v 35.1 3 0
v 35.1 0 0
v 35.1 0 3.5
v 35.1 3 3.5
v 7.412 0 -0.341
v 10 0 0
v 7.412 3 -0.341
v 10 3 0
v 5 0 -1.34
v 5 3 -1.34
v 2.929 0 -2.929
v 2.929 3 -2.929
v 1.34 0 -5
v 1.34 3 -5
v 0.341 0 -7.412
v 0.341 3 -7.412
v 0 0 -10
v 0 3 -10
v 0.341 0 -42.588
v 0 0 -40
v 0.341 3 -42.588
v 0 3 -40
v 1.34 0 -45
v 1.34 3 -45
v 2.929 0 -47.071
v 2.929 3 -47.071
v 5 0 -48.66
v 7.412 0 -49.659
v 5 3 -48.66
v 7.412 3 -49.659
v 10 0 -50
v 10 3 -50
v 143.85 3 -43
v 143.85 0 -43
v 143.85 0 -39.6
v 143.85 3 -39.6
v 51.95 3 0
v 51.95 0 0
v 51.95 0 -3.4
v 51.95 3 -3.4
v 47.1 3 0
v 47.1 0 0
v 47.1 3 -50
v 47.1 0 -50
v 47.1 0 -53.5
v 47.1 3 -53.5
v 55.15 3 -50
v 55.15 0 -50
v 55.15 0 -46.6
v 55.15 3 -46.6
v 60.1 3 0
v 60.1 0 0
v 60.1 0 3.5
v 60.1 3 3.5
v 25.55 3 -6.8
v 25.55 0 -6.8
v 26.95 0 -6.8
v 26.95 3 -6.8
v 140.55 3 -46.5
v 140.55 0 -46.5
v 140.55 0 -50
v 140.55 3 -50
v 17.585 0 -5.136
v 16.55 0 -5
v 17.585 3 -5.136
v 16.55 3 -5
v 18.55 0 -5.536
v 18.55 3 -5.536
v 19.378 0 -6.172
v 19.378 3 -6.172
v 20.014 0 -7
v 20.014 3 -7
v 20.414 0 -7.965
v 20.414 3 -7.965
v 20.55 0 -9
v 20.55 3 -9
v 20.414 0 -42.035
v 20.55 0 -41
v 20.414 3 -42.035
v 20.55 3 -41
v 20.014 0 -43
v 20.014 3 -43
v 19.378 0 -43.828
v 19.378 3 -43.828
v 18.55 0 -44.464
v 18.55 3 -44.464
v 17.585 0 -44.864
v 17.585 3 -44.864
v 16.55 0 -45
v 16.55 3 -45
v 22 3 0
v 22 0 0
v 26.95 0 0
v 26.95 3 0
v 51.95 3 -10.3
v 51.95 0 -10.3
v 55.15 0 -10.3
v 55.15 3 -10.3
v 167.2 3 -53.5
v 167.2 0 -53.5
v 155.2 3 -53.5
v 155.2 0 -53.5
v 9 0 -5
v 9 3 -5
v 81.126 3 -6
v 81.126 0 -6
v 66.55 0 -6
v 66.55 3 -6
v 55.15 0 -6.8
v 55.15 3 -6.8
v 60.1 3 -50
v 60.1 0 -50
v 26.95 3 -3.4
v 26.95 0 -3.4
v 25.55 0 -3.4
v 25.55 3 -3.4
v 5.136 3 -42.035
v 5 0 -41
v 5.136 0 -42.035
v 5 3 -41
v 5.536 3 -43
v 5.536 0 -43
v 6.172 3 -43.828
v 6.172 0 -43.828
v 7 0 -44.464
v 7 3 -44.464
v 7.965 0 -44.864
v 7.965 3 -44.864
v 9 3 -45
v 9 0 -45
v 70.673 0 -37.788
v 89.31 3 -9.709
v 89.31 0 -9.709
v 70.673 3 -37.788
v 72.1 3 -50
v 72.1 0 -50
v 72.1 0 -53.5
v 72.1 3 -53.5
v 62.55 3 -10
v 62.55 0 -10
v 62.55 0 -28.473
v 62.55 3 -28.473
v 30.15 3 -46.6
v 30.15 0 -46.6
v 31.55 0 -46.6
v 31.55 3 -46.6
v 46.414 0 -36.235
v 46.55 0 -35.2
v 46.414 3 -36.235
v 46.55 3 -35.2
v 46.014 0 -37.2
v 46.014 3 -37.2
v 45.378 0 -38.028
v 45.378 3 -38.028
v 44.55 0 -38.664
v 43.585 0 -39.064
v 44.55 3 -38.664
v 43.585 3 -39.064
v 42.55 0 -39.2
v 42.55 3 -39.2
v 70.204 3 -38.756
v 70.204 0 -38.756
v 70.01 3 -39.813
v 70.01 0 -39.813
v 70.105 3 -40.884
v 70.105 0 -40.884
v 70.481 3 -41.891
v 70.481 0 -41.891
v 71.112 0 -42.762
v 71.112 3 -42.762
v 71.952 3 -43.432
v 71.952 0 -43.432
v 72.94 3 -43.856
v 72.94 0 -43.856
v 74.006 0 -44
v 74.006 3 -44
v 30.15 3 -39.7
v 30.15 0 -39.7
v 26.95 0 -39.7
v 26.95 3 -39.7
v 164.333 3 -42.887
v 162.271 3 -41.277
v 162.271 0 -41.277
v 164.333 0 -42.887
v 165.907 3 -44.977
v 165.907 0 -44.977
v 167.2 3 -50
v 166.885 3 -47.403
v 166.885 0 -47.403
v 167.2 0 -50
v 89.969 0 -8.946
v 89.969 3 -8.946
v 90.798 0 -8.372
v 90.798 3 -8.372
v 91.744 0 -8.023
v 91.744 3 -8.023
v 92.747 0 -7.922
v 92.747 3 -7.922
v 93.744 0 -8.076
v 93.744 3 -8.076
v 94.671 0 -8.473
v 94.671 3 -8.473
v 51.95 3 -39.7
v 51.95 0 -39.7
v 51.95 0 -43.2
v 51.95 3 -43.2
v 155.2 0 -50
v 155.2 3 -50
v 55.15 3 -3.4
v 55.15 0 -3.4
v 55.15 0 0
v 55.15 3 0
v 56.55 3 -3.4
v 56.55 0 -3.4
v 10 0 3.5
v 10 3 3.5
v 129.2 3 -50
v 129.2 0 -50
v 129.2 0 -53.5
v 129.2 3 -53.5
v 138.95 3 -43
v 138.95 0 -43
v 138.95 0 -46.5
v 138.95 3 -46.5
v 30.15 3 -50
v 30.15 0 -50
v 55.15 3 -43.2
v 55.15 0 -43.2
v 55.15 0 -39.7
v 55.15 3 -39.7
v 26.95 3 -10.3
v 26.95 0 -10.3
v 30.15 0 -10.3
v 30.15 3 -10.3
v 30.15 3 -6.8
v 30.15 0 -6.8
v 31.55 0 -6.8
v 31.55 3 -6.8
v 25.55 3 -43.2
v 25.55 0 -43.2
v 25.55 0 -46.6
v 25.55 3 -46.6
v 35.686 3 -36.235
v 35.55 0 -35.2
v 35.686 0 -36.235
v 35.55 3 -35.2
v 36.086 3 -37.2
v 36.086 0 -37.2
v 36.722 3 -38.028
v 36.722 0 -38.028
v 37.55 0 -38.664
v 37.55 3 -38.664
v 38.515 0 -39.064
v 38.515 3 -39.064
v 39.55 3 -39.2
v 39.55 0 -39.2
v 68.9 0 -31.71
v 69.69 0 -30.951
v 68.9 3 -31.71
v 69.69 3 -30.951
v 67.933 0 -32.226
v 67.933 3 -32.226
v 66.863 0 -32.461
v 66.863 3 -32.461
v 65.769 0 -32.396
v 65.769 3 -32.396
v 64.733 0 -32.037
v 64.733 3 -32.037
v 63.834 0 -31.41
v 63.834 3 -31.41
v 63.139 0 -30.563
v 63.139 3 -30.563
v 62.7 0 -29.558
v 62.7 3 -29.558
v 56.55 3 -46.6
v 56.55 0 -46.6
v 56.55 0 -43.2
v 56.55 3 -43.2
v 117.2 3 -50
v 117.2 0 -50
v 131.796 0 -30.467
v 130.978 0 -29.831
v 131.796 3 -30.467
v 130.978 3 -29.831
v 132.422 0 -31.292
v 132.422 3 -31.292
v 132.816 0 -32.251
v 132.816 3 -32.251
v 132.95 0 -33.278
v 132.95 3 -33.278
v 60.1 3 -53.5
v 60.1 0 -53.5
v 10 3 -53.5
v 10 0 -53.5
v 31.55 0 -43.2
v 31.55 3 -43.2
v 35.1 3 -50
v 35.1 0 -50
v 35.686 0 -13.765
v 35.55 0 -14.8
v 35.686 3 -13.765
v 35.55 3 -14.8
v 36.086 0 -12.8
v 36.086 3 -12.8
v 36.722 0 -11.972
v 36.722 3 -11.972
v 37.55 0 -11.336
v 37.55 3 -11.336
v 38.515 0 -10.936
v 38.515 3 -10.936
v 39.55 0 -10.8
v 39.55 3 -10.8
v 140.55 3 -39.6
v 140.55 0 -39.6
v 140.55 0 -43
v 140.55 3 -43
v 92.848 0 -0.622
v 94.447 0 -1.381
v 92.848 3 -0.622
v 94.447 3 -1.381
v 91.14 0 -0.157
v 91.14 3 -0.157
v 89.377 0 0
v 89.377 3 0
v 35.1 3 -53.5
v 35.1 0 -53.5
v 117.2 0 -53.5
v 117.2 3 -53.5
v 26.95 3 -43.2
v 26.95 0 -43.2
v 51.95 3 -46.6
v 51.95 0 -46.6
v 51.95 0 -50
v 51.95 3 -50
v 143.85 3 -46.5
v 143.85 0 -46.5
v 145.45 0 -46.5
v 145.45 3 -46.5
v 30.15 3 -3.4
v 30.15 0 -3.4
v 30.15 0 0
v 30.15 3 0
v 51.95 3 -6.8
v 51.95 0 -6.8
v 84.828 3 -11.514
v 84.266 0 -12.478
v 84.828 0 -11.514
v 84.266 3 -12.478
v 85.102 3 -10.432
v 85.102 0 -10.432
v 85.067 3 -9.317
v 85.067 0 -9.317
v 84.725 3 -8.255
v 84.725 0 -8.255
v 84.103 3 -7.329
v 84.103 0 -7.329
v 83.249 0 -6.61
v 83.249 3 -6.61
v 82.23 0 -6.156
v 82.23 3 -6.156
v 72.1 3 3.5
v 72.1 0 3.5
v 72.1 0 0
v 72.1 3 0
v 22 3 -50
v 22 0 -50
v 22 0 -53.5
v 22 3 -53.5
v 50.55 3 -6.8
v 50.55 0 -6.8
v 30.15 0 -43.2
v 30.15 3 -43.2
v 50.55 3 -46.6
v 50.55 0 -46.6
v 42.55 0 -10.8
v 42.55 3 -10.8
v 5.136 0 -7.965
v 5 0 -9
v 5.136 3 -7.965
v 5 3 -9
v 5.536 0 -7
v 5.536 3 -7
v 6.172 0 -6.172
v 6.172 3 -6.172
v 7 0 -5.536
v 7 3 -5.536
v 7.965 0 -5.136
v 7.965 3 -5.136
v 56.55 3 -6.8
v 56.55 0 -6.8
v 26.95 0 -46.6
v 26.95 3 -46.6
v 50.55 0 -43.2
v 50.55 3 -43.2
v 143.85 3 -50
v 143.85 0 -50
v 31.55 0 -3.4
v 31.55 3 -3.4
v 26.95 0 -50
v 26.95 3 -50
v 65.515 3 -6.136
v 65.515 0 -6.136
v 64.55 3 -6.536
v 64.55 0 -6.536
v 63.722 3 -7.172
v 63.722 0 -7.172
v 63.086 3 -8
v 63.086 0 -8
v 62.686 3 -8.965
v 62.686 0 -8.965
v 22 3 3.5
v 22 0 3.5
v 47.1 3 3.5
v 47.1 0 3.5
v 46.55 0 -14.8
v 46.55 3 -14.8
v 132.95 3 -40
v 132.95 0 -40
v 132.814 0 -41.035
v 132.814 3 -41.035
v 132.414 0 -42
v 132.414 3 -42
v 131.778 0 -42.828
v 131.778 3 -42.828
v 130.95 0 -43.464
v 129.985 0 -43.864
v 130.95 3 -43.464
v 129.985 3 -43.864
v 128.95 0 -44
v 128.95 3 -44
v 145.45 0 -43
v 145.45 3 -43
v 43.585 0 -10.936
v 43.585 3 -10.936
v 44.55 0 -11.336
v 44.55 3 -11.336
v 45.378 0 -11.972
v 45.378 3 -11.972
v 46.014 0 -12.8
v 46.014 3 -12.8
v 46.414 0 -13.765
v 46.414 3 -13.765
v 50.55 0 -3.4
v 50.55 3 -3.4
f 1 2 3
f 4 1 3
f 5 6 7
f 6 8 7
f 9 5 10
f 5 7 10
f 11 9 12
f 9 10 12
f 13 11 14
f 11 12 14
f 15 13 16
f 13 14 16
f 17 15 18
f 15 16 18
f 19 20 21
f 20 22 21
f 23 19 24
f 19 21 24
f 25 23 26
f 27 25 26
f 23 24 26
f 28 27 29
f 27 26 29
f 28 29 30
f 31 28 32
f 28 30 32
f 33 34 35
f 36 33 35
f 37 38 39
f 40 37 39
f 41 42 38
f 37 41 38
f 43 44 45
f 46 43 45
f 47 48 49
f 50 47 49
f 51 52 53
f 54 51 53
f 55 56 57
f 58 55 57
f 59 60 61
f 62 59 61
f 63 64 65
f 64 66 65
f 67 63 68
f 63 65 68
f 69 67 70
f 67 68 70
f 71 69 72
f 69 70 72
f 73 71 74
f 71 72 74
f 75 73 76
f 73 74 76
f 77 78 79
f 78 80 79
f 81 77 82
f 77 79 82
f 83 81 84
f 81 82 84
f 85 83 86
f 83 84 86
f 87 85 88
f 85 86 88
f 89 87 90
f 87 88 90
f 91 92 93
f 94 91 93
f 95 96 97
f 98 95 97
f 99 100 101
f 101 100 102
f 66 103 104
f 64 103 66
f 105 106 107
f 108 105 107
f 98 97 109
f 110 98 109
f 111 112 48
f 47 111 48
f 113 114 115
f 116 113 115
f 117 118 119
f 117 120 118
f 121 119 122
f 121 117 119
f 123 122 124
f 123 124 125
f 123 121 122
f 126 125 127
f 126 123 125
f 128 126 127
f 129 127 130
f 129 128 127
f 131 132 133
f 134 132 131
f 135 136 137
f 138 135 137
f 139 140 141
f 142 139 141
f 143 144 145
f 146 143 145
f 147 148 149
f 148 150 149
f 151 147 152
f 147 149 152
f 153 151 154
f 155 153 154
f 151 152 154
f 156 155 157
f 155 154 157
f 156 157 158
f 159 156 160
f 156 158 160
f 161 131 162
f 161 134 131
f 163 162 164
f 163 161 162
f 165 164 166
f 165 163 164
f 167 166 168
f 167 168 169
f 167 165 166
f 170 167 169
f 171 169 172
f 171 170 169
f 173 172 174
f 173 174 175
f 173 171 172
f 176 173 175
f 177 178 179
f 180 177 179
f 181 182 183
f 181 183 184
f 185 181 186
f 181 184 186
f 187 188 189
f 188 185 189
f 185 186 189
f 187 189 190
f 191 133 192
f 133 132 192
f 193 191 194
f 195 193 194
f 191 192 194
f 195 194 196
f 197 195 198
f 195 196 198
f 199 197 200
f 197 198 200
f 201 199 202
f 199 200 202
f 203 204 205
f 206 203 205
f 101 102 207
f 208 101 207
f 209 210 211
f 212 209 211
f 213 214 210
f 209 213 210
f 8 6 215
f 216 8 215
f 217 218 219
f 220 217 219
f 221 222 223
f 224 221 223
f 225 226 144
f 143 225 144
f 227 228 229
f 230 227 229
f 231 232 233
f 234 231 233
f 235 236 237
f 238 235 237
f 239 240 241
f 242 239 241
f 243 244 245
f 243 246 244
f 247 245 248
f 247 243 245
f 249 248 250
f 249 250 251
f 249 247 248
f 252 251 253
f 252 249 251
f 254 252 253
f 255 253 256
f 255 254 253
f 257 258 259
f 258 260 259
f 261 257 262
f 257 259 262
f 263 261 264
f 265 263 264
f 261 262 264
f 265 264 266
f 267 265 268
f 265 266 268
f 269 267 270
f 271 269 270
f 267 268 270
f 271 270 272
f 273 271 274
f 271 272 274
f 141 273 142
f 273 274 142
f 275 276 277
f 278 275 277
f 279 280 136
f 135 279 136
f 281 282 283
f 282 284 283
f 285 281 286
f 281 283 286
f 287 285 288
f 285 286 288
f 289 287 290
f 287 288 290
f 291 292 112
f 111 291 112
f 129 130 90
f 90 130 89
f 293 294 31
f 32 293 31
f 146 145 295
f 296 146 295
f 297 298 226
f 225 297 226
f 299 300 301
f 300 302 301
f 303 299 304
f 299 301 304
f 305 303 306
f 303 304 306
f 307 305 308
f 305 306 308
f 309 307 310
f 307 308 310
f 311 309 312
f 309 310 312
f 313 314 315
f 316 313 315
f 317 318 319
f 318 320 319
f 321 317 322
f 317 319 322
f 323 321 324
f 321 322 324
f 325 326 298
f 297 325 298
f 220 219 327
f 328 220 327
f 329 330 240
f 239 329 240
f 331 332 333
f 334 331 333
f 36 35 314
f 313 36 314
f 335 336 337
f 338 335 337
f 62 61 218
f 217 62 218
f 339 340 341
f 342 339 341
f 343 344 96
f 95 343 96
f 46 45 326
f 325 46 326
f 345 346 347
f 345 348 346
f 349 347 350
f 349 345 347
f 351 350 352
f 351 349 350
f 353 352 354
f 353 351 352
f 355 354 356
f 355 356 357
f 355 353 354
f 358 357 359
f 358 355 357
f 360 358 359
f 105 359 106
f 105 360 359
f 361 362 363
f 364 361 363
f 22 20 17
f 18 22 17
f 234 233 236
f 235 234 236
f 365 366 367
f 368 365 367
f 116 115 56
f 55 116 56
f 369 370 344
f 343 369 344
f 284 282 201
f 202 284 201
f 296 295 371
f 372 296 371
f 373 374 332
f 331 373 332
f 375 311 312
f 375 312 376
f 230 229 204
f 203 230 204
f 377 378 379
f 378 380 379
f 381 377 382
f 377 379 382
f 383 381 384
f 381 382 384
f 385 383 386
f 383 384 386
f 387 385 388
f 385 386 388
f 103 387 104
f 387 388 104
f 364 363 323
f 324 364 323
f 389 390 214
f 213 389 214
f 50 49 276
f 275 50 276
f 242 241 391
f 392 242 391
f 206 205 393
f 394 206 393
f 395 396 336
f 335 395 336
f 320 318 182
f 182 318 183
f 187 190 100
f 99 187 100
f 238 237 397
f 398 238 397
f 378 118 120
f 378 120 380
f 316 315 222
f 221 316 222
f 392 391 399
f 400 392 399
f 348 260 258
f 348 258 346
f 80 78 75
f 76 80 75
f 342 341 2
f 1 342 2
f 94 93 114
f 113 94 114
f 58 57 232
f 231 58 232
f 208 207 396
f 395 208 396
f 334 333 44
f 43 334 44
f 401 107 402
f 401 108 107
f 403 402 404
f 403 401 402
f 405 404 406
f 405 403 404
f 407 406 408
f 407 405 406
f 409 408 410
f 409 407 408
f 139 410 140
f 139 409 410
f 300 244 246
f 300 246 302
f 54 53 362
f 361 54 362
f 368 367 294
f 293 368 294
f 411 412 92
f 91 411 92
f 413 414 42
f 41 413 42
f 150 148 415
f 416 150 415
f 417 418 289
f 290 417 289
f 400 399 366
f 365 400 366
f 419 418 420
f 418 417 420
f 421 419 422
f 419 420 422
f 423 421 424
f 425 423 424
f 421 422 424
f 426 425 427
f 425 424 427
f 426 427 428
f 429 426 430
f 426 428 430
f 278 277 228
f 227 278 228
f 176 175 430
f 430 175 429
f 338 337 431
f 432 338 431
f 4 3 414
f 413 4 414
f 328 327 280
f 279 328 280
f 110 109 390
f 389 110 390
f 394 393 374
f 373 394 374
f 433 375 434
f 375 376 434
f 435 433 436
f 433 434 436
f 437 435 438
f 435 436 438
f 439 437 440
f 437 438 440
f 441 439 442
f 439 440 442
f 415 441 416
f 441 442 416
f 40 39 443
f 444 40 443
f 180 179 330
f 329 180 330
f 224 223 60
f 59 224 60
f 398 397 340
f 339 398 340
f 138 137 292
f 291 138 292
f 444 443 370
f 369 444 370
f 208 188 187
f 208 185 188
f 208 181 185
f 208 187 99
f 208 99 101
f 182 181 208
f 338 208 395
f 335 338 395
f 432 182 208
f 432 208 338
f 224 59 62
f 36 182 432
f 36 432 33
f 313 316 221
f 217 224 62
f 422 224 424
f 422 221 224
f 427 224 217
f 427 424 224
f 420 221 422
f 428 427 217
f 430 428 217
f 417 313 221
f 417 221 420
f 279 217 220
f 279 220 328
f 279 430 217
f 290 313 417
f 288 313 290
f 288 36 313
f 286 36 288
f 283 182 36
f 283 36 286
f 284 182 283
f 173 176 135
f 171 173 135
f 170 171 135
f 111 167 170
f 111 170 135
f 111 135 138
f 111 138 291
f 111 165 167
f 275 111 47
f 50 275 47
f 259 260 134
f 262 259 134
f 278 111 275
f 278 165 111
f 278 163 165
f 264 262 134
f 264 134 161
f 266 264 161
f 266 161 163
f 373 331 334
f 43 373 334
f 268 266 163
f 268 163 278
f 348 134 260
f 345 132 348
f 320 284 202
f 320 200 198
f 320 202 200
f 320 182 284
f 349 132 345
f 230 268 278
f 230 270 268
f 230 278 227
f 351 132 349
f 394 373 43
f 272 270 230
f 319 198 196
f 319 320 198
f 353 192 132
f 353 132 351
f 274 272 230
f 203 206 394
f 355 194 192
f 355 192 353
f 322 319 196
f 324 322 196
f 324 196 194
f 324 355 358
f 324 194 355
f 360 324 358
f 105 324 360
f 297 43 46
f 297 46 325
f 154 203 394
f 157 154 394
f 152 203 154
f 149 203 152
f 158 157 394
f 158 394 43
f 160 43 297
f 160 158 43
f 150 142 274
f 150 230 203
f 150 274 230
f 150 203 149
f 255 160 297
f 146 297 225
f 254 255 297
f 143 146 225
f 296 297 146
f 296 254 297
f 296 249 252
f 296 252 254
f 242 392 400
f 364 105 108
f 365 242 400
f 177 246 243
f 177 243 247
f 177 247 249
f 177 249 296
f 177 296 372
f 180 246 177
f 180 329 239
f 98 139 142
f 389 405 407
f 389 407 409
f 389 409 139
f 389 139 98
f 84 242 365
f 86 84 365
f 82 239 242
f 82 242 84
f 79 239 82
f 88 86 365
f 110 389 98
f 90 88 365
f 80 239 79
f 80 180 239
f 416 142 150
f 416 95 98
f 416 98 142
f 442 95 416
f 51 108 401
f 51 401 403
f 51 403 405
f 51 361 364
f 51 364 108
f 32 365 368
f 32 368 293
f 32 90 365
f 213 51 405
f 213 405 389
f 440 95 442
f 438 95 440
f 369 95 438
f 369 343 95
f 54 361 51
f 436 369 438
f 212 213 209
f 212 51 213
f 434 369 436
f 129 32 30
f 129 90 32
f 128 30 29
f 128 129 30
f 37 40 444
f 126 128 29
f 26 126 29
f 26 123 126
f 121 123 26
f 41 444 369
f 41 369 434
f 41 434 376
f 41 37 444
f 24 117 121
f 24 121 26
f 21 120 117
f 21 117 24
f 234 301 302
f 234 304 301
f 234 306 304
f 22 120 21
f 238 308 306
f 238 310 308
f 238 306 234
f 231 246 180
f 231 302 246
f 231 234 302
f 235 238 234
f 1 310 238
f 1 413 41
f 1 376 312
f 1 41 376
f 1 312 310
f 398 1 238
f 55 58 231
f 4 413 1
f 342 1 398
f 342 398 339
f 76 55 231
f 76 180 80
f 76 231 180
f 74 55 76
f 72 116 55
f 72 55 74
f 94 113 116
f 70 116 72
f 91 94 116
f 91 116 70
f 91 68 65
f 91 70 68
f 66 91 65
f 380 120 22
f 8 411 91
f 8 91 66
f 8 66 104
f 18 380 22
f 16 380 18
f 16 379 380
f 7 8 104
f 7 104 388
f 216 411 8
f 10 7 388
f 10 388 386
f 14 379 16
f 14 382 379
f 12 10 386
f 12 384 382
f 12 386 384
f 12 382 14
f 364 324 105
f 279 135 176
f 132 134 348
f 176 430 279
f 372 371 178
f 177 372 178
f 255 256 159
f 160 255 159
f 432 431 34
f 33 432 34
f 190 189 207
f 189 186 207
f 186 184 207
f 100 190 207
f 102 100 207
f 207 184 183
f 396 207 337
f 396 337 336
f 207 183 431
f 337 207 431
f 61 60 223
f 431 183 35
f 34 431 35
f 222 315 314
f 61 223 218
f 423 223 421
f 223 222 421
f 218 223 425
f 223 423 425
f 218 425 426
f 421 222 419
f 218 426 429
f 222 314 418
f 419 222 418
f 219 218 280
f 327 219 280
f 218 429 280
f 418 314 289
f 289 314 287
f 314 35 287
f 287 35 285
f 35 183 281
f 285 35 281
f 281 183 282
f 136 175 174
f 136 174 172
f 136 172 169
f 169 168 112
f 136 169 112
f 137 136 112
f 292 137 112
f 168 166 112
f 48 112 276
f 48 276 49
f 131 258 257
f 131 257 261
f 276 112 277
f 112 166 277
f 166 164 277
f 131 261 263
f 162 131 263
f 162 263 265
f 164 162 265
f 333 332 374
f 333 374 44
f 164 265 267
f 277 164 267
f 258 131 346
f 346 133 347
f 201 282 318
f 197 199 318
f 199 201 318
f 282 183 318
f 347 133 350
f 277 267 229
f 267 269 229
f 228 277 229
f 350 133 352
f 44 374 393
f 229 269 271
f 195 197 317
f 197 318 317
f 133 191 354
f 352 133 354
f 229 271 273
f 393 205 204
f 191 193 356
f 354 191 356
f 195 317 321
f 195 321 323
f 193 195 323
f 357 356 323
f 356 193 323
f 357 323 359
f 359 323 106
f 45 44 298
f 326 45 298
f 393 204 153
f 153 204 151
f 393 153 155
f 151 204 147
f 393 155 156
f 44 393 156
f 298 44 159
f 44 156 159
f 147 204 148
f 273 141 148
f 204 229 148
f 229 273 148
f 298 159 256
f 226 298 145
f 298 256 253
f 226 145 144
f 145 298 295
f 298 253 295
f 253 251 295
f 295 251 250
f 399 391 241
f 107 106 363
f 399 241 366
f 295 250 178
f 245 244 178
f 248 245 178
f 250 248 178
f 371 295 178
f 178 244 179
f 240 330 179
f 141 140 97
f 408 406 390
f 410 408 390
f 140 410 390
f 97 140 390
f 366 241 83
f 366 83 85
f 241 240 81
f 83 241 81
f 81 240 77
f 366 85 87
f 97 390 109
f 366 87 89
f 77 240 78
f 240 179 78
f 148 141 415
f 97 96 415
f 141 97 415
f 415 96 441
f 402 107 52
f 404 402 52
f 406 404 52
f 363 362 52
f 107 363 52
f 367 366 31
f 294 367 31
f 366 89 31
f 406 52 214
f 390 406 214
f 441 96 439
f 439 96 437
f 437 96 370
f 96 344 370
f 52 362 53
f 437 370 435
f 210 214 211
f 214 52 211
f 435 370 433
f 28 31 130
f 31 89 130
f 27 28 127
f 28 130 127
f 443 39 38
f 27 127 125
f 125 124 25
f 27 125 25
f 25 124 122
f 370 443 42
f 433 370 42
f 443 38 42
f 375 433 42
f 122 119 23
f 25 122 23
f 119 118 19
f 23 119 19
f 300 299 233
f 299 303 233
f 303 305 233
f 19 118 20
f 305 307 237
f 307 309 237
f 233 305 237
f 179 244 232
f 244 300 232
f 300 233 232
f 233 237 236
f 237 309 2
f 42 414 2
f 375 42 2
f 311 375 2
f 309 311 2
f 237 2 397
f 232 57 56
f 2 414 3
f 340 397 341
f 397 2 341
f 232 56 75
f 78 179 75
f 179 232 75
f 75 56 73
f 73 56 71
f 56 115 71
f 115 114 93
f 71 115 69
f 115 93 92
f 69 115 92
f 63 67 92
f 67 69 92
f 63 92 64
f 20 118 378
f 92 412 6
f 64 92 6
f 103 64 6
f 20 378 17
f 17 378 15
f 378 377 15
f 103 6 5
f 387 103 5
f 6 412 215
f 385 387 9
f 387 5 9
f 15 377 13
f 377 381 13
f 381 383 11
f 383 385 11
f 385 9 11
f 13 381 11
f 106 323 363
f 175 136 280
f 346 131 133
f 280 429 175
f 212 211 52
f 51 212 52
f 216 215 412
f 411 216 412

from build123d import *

# Parameters (mm, degrees)
EXTRUDE_1_DEPTH     = 3
FILLET_1_R          = 10
FILLET_2_R          = 10
SKETCH_2_W          = 11
SKETCH_2_H          = 28.4
SKETCH_2_W_2        = 15.55
SKETCH_2_H_2        = 40
CUT_EXTRUDE_1_DEPTH = 176.576963147
FILLET_3_R          = 4
EXTRUDE_START       = -3
EXTRUDE_2_DEPTH     = 3
FILLET_4_R          = 4


# Some blends are built 0.0001 mm under size
with BuildPart() as part:
    # 草图1 → 凸台-拉伸1 (new body)
    with BuildSketch(Plane(origin=(0, 0, 0), x_dir=(1, 0, 0), z_dir=(0, 1, 0))):
        Polygon((0, 0), (10, 0), (10, -3.5), (22, -3.5), (22, 0), (26.95, 0), (26.95, 3.4), (25.55, 3.4), (25.55, 6.8), (26.95, 6.8), (26.95, 10.3), (30.15, 10.3), (30.15, 6.8), (31.55, 6.8), (31.55, 3.4), (30.15, 3.4), (30.15, 0), (35.1, 0), (35.1, -3.5), (47.1, -3.5), (47.1, 0), (51.95, 0), (51.95, 3.4), (50.55, 3.4), (50.55, 6.8), (51.95, 6.8), (51.95, 10.3), (55.15, 10.3), (55.15, 6.8), (56.55, 6.8), (56.55, 3.4), (55.15, 3.4), (55.15, 0), (60.1, 0), (60.1, -3.5), (72.1, -3.5), (72.1, 0), (92.1, 0), (177.1, 50), (167.2, 50), (167.2, 53.5), (155.2, 53.5), (155.2, 50), (143.85, 50), (143.85, 46.5), (145.45, 46.5), (145.45, 43), (143.85, 43), (143.85, 39.6), (140.55, 39.6), (140.55, 43), (138.95, 43), (138.95, 46.5), (140.55, 46.5), (140.55, 50), (129.2, 50), (129.2, 53.5), (117.2, 53.5), (117.2, 50), (72.1, 50), (72.1, 53.5), (60.1, 53.5), (60.1, 50), (55.15, 50), (55.15, 46.6), (56.55, 46.6), (56.55, 43.2), (55.15, 43.2), (55.15, 39.7), (51.95, 39.7), (51.95, 43.2), (50.55, 43.2), (50.55, 46.6), (51.95, 46.6), (51.95, 50), (47.1, 50), (47.1, 53.5), (35.1, 53.5), (35.1, 50), (30.15, 50), (30.15, 46.6), (31.55, 46.6), (31.55, 43.2), (30.15, 43.2), (30.15, 39.7), (26.95, 39.7), (26.95, 43.2), (25.55, 43.2), (25.55, 46.6), (26.95, 46.6), (26.95, 50), (22, 50), (22, 53.5), (10, 53.5), (10, 50), (0, 50), align=None)
    extrude(amount=EXTRUDE_1_DEPTH)

    # 圆角1
    # the kernel refuses this fillet: 10 mm, written as the material it takes off along each edge
    with BuildSketch(Plane(origin=(177.1, -43.011578588, -50), x_dir=(-0.8619342151577696, 0, 0.5070201265633938), z_dir=(0, 1, 0))) as fillet_1_piece_1:
        with BuildLine():
            CenterArc((17.204631435, -10), FILLET_1_R, 90, 60.128922386)
            Line((8.53314873, -5.019499253), (8.359719076, -4.919889238))
            ThreePointArc((8.359719076, -4.919889238), (4.16517034, -2.68213647), (-0.101404025, -0.172386843))
            Line((-0.101404025, -0.172386843), (0, 0.2))
            Line((0, 0.2), (17.204631435, 0.2))
            Line((17.204631435, 0.2), (17.204631435, 0))
        make_face()
    extrude(amount=89.023157177, mode=Mode.SUBTRACT)

    # 圆角2
    fillet_2_edges = [part.edges().sort_by_distance(p)[0] for p in [
        (92.1, 1.5, 0),
        (0, 1.5, -50),
        (0, 1.5, 0),
    ]]
    fillet(fillet_2_edges, radius=FILLET_2_R - 0.0001)  # a hair under: the kernel refuses the full size

    # 草图2 → 切除-拉伸1 (cut, through all)
    with BuildSketch(Plane.XZ):
        Polygon((62.55, -6), (62.55, -44), (132.95, -44), (132.95, -30.990499855), (90.466150246, -6), align=None)
        with Locations((41.05, -25)):
            Rectangle(SKETCH_2_W, SKETCH_2_H)
        with Locations((12.775, -25)):
            Rectangle(SKETCH_2_W_2, SKETCH_2_H_2)
    extrude(amount=-CUT_EXTRUDE_1_DEPTH, mode=Mode.SUBTRACT)

    # 圆角3
    fillet_3_edges = [part.edges().sort_by_distance(p)[0] for p in [
        (62.55, 1.5, -6),
        (90.466150246, 1.5, -6),
        (132.95, 1.5, -30.990499855),
        (132.95, 1.5, -44),
        (62.55, 1.5, -44),
        (35.55, 1.5, -39.2),
        (35.55, 1.5, -10.8),
        (46.55, 1.5, -10.8),
        (46.55, 1.5, -39.2),
        (5, 1.5, -45),
        (5, 1.5, -5),
        (20.55, 1.5, -5),
        (20.55, 1.5, -45),
    ]]
    fillet(fillet_3_edges, radius=FILLET_3_R)

    # 草图3 → 凸台-拉伸2 (add)
    with BuildSketch(Plane.XZ.offset(EXTRUDE_START)):
        with BuildLine():
            Line((62.55, -40), (89.376917077, -6))
            ThreePointArc((89.376917077, -6), (90.427881528, -6.140534529), (91.404997583, -6.552263139))
            Line((91.404997583, -6.552263139), (66.55, -44))
            ThreePointArc((66.55, -44), (63.721572875, -42.828427125), (62.55, -40))
        make_face()
    extrude(amount=EXTRUDE_2_DEPTH)

    # 圆角4
    fillet_4_edges = [part.edges().sort_by_distance(p)[0] for p in [
        (91.404997583, 1.5, -6.552263139),
        (66.55, 1.5, -44),
        (89.376917077, 1.5, -6),
        (62.55, 1.5, -40),
    ]]
    fillet(fillet_4_edges, radius=FILLET_4_R)


solid = part.part
